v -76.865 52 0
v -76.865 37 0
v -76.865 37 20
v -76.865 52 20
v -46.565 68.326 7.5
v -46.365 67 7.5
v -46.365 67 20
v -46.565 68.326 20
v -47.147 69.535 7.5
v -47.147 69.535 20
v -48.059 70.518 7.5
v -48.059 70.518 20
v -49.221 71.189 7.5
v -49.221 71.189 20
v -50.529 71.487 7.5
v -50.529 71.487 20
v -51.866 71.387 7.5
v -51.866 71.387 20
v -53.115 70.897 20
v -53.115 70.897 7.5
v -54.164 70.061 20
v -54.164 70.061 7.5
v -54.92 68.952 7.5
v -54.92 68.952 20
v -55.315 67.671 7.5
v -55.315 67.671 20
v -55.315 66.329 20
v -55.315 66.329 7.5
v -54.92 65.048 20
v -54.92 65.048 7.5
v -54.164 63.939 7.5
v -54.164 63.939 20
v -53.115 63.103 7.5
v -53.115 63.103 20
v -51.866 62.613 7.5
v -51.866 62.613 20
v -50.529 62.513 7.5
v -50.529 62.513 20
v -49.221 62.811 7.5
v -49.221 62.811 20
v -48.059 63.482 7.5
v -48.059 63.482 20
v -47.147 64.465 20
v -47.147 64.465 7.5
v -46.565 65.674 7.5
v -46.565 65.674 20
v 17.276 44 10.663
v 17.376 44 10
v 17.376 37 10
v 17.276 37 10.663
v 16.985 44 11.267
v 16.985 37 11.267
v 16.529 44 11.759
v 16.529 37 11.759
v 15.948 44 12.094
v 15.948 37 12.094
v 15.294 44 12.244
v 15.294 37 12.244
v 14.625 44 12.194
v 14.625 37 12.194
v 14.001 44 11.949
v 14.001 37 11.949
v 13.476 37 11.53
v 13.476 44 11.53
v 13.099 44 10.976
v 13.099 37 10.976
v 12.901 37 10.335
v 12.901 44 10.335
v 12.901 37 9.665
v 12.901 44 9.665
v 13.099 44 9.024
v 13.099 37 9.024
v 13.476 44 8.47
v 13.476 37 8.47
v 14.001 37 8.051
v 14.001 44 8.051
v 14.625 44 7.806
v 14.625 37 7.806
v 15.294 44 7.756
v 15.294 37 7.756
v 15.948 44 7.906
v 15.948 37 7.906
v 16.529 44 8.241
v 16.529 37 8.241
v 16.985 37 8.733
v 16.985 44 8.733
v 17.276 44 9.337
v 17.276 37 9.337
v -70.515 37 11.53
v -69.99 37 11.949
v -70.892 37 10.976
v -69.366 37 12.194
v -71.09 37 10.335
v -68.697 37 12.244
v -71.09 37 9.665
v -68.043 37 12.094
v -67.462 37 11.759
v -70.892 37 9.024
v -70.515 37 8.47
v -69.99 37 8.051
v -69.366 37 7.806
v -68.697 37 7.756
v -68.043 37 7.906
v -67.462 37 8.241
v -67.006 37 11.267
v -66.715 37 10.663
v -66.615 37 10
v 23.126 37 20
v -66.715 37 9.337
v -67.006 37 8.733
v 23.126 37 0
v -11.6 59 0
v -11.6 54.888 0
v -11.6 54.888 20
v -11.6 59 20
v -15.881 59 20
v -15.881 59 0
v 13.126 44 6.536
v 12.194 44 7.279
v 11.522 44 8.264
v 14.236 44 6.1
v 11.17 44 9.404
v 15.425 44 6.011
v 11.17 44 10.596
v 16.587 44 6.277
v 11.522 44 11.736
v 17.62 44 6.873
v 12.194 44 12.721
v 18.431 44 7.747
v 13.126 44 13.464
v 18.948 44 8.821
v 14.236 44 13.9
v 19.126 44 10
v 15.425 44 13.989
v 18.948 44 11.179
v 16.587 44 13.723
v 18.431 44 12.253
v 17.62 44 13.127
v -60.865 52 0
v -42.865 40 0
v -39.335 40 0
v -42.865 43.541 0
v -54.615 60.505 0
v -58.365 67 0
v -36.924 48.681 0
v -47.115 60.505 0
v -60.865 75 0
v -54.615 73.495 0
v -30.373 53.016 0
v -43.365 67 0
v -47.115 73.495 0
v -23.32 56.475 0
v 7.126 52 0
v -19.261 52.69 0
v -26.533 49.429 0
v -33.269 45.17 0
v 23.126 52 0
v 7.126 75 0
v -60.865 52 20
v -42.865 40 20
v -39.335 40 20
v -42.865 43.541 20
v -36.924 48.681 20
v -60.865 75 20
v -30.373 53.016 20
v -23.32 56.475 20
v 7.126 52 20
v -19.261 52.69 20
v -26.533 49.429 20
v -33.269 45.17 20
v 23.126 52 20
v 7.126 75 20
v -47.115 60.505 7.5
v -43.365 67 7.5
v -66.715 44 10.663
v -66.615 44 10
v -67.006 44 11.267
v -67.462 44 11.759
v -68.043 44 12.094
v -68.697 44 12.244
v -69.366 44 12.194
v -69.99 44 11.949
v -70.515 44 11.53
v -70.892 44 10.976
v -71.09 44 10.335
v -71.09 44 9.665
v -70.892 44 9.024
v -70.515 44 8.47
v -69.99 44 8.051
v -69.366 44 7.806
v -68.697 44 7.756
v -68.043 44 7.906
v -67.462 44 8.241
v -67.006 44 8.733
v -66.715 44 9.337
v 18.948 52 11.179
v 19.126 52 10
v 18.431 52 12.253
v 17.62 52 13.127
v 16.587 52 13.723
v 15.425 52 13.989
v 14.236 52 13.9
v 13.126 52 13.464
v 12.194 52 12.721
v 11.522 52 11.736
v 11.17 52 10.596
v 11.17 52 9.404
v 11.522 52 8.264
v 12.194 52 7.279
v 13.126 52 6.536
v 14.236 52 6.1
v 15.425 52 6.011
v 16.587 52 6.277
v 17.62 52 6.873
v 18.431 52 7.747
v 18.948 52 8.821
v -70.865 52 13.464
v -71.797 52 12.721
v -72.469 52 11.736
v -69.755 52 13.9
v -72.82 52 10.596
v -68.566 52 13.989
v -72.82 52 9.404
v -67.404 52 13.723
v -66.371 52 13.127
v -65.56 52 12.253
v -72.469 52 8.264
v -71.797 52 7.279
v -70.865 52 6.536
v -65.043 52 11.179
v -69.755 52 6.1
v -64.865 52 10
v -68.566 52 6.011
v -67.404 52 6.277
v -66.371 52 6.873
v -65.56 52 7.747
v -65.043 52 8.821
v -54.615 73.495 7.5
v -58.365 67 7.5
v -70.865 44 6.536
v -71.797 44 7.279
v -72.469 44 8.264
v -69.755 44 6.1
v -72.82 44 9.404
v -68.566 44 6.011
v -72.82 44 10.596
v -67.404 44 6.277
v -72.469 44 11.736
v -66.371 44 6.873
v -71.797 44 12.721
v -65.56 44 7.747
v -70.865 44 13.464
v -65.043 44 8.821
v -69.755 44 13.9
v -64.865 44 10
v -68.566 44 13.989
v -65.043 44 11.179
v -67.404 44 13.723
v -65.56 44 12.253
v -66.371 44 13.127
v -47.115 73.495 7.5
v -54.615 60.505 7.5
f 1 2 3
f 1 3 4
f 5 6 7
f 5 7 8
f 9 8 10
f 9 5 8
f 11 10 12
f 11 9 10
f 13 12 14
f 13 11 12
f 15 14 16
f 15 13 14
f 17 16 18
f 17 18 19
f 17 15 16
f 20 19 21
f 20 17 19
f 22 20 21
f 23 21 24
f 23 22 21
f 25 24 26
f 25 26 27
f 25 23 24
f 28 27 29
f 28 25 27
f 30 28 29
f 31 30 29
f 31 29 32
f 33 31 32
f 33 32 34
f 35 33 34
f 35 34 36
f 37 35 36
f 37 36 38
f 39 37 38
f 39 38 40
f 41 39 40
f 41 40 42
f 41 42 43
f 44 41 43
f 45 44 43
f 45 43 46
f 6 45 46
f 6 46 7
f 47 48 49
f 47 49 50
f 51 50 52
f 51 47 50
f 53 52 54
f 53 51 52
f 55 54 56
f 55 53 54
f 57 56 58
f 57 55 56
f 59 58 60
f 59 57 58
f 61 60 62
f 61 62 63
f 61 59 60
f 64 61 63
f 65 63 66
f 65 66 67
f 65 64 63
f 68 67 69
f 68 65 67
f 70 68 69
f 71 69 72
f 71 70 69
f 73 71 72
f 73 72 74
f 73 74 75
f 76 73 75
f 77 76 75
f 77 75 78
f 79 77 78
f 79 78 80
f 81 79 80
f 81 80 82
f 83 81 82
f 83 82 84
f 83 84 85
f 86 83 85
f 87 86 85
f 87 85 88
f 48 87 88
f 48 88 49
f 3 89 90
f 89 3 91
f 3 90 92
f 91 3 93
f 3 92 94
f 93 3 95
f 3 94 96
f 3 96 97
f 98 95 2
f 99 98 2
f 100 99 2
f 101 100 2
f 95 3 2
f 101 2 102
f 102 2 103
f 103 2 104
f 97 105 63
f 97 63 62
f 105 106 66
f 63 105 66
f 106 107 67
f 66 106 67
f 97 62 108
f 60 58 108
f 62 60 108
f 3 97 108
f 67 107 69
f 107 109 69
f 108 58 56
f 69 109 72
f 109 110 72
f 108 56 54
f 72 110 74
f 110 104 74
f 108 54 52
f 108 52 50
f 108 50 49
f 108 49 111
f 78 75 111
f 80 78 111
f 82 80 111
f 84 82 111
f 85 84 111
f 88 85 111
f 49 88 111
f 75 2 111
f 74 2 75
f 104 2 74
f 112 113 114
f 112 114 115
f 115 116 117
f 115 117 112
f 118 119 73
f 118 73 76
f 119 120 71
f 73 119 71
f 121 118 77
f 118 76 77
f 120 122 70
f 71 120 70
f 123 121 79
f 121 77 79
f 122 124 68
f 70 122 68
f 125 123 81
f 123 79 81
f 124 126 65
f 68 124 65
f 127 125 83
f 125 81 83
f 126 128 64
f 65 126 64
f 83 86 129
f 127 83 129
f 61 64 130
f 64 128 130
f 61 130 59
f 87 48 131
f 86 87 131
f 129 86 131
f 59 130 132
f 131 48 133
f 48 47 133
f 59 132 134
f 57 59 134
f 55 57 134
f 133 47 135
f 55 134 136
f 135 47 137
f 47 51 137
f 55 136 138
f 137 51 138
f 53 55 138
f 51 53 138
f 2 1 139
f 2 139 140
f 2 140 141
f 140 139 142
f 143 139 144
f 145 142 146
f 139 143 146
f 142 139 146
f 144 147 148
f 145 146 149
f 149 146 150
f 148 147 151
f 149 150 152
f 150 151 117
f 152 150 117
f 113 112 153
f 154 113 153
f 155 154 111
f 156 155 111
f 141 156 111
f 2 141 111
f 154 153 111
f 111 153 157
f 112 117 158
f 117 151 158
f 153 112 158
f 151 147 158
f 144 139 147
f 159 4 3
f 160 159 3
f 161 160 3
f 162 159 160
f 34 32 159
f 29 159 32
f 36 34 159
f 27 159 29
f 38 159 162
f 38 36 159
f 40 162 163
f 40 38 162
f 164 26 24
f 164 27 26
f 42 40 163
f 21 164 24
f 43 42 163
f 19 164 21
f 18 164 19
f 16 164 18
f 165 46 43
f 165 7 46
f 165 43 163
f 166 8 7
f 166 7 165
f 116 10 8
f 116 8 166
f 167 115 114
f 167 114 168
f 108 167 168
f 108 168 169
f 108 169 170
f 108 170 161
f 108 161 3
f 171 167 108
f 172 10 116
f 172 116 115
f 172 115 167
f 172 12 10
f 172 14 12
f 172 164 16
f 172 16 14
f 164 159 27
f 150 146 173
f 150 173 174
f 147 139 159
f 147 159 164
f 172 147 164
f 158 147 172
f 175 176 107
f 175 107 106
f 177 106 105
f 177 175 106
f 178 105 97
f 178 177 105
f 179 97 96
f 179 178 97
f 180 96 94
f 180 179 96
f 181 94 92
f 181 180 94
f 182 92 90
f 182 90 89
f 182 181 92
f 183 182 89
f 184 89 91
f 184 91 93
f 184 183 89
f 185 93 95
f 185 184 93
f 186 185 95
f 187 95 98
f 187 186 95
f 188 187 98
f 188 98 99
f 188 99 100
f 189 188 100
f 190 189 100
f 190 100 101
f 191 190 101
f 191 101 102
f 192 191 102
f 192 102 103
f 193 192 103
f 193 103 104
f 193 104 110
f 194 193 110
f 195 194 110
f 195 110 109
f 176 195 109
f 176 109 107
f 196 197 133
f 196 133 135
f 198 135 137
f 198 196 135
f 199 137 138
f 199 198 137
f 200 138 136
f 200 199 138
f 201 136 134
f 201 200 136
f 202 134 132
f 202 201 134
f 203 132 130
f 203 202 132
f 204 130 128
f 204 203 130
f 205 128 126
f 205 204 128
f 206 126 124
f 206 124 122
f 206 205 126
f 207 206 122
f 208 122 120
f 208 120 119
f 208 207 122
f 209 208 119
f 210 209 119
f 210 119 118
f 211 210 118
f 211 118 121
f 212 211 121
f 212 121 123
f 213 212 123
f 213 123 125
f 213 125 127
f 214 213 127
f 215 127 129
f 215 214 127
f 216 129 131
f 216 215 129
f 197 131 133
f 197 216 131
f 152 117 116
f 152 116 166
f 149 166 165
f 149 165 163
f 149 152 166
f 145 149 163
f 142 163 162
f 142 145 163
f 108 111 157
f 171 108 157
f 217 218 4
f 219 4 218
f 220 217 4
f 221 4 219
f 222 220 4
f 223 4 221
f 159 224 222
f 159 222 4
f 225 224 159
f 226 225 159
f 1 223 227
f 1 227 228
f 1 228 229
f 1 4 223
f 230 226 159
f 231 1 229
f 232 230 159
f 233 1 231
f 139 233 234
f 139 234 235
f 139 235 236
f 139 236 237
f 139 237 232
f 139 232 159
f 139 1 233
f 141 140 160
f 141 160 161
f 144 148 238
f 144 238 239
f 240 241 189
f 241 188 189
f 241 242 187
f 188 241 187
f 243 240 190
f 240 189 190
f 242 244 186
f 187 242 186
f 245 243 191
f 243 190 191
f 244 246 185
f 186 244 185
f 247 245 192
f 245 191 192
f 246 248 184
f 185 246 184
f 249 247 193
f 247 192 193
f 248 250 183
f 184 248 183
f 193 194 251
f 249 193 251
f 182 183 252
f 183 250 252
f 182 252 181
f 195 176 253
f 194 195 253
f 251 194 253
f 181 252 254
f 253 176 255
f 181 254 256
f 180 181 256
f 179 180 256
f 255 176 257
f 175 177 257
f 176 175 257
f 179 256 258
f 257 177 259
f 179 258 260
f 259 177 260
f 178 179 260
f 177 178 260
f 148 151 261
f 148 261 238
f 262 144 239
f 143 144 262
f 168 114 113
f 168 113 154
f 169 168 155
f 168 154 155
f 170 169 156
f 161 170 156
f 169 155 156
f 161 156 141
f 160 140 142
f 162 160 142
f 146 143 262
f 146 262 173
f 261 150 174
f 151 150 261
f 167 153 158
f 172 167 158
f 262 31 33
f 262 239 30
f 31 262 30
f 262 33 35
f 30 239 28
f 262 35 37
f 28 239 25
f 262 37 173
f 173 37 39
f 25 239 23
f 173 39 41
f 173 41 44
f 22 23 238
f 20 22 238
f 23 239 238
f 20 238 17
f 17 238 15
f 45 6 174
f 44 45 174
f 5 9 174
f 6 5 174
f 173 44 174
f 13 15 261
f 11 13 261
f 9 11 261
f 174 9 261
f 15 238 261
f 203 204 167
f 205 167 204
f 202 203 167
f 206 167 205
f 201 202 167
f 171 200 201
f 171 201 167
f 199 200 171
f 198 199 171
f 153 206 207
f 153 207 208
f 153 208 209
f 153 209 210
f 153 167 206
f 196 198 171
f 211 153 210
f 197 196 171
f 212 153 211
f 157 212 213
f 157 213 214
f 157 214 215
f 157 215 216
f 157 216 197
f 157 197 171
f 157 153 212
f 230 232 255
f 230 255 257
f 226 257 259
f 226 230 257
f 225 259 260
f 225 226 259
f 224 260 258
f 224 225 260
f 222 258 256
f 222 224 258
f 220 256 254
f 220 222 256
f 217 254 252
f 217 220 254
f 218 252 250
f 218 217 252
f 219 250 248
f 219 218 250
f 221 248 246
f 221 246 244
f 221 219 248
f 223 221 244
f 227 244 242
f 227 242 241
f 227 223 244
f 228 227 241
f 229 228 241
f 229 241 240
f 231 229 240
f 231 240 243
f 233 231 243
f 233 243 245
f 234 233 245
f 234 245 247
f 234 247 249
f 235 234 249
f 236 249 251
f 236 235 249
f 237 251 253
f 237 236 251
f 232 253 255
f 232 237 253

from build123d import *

# Parameters (mm, degrees)
CYLINDER019_R             = 1.7
CYLINDER019_DEPTH         = 20
PAD004_DEPTH              = 7.5
BOX003_W                  = 31.265144
BOX003_H                  = 19
BOX003_DEPTH              = 20
CYLINDER_R                = 56.1
CYLINDER_DEPTH            = 20
CYLINDER017_R             = 61.1
CYLINDER017_DEPTH         = 20
CYLINDER020_R             = 3.5
CYLINDER020_DEPTH         = 5
CYLINDER021_R             = 4
CYLINDER021_DEPTH         = 8
CYLINDER022_R             = 2.25
CYLINDER022_DEPTH         = 15
FUSION008_PLACEMENT_ANGLE = 90
CYLINDER023_R             = 4
CYLINDER023_DEPTH         = 8
CYLINDER024_R             = 2.25
CYLINDER024_DEPTH         = 15
FUSION009_PLACEMENT_ANGLE = 90
CYLINDER018_R             = 4.5
CYLINDER018_DEPTH         = 20
BOX005_W                  = 99.990908
BOX005_H                  = 15
BOX005_DEPTH              = 20
BOX004_W                  = 67.990908
BOX004_H                  = 38
BOX004_DEPTH              = 20


with BuildPart() as cylinder019:
    # Cylinder019 → Cylinder019 (new body)
    with BuildSketch(Plane(origin=(14.125764, 59, 0), x_dir=(1, 0, 0), z_dir=(0, 0, 1))):
        Circle(CYLINDER019_R)
    extrude(amount=CYLINDER019_DEPTH)


with BuildPart() as m8press002:
    # Sketch004 → Pad004 (new body)
    with BuildSketch(Plane.XY):
        Polygon((7.5, 0), (3.75, 6.495191), (-3.75, 6.495191), (-7.5, 0), (-3.75, -6.495191), (3.75, -6.495191), align=None)
    extrude(amount=PAD004_DEPTH)


with BuildPart() as m8press002_1:
    # Body004 placement: moved
    add(m8press002.part.moved(Location((-50.865144, 67, 0))))


with BuildPart() as cube003:
    # Box003 → Box003 (new body)
    with BuildSketch(Plane(origin=(-42.865144, 40, 0), x_dir=(1, 0, 0), z_dir=(0, 0, 1))):
        with Locations((15.632572, 9.5)):
            Rectangle(BOX003_W, BOX003_H)
    extrude(amount=BOX003_DEPTH)


with BuildPart() as cylinder:
    # Cylinder → Cylinder (new body)
    with BuildSketch(Plane.XY):
        Circle(CYLINDER_R)
    extrude(amount=CYLINDER_DEPTH)


with BuildPart() as common:
    # Cylinder017 → Cylinder017 (new body)
    with BuildSketch(Plane.XY):
        Circle(CYLINDER017_R)
    extrude(amount=CYLINDER017_DEPTH)

    # Cut: cut Cylinder
    add(cylinder.part, mode=Mode.SUBTRACT)

    # Common: intersect Cube003
    add(cube003.part, mode=Mode.INTERSECT)


with BuildPart() as cylinder020:
    # Cylinder020 → Cylinder020 (new body)
    with BuildSketch(Plane(origin=(14.125764, 59, 15), x_dir=(1, 0, 0), z_dir=(0, 0, 1))):
        Circle(CYLINDER020_R)
    extrude(amount=CYLINDER020_DEPTH)


with BuildPart() as cylinder021:
    # Cylinder021 → Cylinder021 (new body)
    with BuildSketch(Plane.XY):
        Circle(CYLINDER021_R)
    extrude(amount=CYLINDER021_DEPTH)


with BuildPart() as fusion008:
    # Cylinder022 → Cylinder022 (new body)
    with BuildSketch(Plane.XY):
        Circle(CYLINDER022_R)
    extrude(amount=CYLINDER022_DEPTH)

    # Fusion008: union Cylinder021
    add(cylinder021.part)


with BuildPart() as fusion008_1:
    # Fusion008 placement: moved
    add(fusion008.part.moved(Location((-68.865144, 52, 10))).rotate(Axis((-68.865144, 52, 10), (1, 0, 0)), FUSION008_PLACEMENT_ANGLE))


with BuildPart() as cylinder023:
    # Cylinder023 → Cylinder023 (new body)
    with BuildSketch(Plane.XY):
        Circle(CYLINDER023_R)
    extrude(amount=CYLINDER023_DEPTH)


with BuildPart() as fusion009:
    # Cylinder024 → Cylinder024 (new body)
    with BuildSketch(Plane.XY):
        Circle(CYLINDER024_R)
    extrude(amount=CYLINDER024_DEPTH)

    # Fusion009: union Cylinder023
    add(cylinder023.part)


with BuildPart() as fusion009_1:
    # Fusion009 placement: moved
    add(fusion009.part.moved(Location((15.125764, 52, 10))).rotate(Axis((15.125764, 52, 10), (1, 0, 0)), FUSION009_PLACEMENT_ANGLE))


with BuildPart() as fusion011:
    # Cylinder018 → Cylinder018 (new body)
    with BuildSketch(Plane(origin=(-50.865144, 67, 0), x_dir=(1, 0, 0), z_dir=(0, 0, 1))):
        Circle(CYLINDER018_R)
    extrude(amount=CYLINDER018_DEPTH)

    # Fusion011: union Cylinder019, M8Press002, Common, Cylinder020, Fusion008, Fusion009
    add(cylinder019.part)
    add(m8press002_1.part)
    add(common.part)
    add(cylinder020.part)
    add(fusion008_1.part)
    add(fusion009_1.part)


with BuildPart() as cube005:
    # Box005 → Box005 (new body)
    with BuildSketch(Plane(origin=(-76.865144, 37, 0), x_dir=(1, 0, 0), z_dir=(0, 0, 1))):
        with Locations((49.995454, 7.5)):
            Rectangle(BOX005_W, BOX005_H)
    extrude(amount=BOX005_DEPTH)


with BuildPart() as cut006:
    # Box004 → Box004 (new body)
    with BuildSketch(Plane(origin=(-60.865144, 37, 0), x_dir=(1, 0, 0), z_dir=(0, 0, 1))):
        with Locations((33.995454, 19)):
            Rectangle(BOX004_W, BOX004_H)
    extrude(amount=BOX004_DEPTH)

    # Fusion010: union Cube005
    add(cube005.part)

    # Cut006: cut Fusion011
    add(fusion011.part, mode=Mode.SUBTRACT)


solid = cut006.part
